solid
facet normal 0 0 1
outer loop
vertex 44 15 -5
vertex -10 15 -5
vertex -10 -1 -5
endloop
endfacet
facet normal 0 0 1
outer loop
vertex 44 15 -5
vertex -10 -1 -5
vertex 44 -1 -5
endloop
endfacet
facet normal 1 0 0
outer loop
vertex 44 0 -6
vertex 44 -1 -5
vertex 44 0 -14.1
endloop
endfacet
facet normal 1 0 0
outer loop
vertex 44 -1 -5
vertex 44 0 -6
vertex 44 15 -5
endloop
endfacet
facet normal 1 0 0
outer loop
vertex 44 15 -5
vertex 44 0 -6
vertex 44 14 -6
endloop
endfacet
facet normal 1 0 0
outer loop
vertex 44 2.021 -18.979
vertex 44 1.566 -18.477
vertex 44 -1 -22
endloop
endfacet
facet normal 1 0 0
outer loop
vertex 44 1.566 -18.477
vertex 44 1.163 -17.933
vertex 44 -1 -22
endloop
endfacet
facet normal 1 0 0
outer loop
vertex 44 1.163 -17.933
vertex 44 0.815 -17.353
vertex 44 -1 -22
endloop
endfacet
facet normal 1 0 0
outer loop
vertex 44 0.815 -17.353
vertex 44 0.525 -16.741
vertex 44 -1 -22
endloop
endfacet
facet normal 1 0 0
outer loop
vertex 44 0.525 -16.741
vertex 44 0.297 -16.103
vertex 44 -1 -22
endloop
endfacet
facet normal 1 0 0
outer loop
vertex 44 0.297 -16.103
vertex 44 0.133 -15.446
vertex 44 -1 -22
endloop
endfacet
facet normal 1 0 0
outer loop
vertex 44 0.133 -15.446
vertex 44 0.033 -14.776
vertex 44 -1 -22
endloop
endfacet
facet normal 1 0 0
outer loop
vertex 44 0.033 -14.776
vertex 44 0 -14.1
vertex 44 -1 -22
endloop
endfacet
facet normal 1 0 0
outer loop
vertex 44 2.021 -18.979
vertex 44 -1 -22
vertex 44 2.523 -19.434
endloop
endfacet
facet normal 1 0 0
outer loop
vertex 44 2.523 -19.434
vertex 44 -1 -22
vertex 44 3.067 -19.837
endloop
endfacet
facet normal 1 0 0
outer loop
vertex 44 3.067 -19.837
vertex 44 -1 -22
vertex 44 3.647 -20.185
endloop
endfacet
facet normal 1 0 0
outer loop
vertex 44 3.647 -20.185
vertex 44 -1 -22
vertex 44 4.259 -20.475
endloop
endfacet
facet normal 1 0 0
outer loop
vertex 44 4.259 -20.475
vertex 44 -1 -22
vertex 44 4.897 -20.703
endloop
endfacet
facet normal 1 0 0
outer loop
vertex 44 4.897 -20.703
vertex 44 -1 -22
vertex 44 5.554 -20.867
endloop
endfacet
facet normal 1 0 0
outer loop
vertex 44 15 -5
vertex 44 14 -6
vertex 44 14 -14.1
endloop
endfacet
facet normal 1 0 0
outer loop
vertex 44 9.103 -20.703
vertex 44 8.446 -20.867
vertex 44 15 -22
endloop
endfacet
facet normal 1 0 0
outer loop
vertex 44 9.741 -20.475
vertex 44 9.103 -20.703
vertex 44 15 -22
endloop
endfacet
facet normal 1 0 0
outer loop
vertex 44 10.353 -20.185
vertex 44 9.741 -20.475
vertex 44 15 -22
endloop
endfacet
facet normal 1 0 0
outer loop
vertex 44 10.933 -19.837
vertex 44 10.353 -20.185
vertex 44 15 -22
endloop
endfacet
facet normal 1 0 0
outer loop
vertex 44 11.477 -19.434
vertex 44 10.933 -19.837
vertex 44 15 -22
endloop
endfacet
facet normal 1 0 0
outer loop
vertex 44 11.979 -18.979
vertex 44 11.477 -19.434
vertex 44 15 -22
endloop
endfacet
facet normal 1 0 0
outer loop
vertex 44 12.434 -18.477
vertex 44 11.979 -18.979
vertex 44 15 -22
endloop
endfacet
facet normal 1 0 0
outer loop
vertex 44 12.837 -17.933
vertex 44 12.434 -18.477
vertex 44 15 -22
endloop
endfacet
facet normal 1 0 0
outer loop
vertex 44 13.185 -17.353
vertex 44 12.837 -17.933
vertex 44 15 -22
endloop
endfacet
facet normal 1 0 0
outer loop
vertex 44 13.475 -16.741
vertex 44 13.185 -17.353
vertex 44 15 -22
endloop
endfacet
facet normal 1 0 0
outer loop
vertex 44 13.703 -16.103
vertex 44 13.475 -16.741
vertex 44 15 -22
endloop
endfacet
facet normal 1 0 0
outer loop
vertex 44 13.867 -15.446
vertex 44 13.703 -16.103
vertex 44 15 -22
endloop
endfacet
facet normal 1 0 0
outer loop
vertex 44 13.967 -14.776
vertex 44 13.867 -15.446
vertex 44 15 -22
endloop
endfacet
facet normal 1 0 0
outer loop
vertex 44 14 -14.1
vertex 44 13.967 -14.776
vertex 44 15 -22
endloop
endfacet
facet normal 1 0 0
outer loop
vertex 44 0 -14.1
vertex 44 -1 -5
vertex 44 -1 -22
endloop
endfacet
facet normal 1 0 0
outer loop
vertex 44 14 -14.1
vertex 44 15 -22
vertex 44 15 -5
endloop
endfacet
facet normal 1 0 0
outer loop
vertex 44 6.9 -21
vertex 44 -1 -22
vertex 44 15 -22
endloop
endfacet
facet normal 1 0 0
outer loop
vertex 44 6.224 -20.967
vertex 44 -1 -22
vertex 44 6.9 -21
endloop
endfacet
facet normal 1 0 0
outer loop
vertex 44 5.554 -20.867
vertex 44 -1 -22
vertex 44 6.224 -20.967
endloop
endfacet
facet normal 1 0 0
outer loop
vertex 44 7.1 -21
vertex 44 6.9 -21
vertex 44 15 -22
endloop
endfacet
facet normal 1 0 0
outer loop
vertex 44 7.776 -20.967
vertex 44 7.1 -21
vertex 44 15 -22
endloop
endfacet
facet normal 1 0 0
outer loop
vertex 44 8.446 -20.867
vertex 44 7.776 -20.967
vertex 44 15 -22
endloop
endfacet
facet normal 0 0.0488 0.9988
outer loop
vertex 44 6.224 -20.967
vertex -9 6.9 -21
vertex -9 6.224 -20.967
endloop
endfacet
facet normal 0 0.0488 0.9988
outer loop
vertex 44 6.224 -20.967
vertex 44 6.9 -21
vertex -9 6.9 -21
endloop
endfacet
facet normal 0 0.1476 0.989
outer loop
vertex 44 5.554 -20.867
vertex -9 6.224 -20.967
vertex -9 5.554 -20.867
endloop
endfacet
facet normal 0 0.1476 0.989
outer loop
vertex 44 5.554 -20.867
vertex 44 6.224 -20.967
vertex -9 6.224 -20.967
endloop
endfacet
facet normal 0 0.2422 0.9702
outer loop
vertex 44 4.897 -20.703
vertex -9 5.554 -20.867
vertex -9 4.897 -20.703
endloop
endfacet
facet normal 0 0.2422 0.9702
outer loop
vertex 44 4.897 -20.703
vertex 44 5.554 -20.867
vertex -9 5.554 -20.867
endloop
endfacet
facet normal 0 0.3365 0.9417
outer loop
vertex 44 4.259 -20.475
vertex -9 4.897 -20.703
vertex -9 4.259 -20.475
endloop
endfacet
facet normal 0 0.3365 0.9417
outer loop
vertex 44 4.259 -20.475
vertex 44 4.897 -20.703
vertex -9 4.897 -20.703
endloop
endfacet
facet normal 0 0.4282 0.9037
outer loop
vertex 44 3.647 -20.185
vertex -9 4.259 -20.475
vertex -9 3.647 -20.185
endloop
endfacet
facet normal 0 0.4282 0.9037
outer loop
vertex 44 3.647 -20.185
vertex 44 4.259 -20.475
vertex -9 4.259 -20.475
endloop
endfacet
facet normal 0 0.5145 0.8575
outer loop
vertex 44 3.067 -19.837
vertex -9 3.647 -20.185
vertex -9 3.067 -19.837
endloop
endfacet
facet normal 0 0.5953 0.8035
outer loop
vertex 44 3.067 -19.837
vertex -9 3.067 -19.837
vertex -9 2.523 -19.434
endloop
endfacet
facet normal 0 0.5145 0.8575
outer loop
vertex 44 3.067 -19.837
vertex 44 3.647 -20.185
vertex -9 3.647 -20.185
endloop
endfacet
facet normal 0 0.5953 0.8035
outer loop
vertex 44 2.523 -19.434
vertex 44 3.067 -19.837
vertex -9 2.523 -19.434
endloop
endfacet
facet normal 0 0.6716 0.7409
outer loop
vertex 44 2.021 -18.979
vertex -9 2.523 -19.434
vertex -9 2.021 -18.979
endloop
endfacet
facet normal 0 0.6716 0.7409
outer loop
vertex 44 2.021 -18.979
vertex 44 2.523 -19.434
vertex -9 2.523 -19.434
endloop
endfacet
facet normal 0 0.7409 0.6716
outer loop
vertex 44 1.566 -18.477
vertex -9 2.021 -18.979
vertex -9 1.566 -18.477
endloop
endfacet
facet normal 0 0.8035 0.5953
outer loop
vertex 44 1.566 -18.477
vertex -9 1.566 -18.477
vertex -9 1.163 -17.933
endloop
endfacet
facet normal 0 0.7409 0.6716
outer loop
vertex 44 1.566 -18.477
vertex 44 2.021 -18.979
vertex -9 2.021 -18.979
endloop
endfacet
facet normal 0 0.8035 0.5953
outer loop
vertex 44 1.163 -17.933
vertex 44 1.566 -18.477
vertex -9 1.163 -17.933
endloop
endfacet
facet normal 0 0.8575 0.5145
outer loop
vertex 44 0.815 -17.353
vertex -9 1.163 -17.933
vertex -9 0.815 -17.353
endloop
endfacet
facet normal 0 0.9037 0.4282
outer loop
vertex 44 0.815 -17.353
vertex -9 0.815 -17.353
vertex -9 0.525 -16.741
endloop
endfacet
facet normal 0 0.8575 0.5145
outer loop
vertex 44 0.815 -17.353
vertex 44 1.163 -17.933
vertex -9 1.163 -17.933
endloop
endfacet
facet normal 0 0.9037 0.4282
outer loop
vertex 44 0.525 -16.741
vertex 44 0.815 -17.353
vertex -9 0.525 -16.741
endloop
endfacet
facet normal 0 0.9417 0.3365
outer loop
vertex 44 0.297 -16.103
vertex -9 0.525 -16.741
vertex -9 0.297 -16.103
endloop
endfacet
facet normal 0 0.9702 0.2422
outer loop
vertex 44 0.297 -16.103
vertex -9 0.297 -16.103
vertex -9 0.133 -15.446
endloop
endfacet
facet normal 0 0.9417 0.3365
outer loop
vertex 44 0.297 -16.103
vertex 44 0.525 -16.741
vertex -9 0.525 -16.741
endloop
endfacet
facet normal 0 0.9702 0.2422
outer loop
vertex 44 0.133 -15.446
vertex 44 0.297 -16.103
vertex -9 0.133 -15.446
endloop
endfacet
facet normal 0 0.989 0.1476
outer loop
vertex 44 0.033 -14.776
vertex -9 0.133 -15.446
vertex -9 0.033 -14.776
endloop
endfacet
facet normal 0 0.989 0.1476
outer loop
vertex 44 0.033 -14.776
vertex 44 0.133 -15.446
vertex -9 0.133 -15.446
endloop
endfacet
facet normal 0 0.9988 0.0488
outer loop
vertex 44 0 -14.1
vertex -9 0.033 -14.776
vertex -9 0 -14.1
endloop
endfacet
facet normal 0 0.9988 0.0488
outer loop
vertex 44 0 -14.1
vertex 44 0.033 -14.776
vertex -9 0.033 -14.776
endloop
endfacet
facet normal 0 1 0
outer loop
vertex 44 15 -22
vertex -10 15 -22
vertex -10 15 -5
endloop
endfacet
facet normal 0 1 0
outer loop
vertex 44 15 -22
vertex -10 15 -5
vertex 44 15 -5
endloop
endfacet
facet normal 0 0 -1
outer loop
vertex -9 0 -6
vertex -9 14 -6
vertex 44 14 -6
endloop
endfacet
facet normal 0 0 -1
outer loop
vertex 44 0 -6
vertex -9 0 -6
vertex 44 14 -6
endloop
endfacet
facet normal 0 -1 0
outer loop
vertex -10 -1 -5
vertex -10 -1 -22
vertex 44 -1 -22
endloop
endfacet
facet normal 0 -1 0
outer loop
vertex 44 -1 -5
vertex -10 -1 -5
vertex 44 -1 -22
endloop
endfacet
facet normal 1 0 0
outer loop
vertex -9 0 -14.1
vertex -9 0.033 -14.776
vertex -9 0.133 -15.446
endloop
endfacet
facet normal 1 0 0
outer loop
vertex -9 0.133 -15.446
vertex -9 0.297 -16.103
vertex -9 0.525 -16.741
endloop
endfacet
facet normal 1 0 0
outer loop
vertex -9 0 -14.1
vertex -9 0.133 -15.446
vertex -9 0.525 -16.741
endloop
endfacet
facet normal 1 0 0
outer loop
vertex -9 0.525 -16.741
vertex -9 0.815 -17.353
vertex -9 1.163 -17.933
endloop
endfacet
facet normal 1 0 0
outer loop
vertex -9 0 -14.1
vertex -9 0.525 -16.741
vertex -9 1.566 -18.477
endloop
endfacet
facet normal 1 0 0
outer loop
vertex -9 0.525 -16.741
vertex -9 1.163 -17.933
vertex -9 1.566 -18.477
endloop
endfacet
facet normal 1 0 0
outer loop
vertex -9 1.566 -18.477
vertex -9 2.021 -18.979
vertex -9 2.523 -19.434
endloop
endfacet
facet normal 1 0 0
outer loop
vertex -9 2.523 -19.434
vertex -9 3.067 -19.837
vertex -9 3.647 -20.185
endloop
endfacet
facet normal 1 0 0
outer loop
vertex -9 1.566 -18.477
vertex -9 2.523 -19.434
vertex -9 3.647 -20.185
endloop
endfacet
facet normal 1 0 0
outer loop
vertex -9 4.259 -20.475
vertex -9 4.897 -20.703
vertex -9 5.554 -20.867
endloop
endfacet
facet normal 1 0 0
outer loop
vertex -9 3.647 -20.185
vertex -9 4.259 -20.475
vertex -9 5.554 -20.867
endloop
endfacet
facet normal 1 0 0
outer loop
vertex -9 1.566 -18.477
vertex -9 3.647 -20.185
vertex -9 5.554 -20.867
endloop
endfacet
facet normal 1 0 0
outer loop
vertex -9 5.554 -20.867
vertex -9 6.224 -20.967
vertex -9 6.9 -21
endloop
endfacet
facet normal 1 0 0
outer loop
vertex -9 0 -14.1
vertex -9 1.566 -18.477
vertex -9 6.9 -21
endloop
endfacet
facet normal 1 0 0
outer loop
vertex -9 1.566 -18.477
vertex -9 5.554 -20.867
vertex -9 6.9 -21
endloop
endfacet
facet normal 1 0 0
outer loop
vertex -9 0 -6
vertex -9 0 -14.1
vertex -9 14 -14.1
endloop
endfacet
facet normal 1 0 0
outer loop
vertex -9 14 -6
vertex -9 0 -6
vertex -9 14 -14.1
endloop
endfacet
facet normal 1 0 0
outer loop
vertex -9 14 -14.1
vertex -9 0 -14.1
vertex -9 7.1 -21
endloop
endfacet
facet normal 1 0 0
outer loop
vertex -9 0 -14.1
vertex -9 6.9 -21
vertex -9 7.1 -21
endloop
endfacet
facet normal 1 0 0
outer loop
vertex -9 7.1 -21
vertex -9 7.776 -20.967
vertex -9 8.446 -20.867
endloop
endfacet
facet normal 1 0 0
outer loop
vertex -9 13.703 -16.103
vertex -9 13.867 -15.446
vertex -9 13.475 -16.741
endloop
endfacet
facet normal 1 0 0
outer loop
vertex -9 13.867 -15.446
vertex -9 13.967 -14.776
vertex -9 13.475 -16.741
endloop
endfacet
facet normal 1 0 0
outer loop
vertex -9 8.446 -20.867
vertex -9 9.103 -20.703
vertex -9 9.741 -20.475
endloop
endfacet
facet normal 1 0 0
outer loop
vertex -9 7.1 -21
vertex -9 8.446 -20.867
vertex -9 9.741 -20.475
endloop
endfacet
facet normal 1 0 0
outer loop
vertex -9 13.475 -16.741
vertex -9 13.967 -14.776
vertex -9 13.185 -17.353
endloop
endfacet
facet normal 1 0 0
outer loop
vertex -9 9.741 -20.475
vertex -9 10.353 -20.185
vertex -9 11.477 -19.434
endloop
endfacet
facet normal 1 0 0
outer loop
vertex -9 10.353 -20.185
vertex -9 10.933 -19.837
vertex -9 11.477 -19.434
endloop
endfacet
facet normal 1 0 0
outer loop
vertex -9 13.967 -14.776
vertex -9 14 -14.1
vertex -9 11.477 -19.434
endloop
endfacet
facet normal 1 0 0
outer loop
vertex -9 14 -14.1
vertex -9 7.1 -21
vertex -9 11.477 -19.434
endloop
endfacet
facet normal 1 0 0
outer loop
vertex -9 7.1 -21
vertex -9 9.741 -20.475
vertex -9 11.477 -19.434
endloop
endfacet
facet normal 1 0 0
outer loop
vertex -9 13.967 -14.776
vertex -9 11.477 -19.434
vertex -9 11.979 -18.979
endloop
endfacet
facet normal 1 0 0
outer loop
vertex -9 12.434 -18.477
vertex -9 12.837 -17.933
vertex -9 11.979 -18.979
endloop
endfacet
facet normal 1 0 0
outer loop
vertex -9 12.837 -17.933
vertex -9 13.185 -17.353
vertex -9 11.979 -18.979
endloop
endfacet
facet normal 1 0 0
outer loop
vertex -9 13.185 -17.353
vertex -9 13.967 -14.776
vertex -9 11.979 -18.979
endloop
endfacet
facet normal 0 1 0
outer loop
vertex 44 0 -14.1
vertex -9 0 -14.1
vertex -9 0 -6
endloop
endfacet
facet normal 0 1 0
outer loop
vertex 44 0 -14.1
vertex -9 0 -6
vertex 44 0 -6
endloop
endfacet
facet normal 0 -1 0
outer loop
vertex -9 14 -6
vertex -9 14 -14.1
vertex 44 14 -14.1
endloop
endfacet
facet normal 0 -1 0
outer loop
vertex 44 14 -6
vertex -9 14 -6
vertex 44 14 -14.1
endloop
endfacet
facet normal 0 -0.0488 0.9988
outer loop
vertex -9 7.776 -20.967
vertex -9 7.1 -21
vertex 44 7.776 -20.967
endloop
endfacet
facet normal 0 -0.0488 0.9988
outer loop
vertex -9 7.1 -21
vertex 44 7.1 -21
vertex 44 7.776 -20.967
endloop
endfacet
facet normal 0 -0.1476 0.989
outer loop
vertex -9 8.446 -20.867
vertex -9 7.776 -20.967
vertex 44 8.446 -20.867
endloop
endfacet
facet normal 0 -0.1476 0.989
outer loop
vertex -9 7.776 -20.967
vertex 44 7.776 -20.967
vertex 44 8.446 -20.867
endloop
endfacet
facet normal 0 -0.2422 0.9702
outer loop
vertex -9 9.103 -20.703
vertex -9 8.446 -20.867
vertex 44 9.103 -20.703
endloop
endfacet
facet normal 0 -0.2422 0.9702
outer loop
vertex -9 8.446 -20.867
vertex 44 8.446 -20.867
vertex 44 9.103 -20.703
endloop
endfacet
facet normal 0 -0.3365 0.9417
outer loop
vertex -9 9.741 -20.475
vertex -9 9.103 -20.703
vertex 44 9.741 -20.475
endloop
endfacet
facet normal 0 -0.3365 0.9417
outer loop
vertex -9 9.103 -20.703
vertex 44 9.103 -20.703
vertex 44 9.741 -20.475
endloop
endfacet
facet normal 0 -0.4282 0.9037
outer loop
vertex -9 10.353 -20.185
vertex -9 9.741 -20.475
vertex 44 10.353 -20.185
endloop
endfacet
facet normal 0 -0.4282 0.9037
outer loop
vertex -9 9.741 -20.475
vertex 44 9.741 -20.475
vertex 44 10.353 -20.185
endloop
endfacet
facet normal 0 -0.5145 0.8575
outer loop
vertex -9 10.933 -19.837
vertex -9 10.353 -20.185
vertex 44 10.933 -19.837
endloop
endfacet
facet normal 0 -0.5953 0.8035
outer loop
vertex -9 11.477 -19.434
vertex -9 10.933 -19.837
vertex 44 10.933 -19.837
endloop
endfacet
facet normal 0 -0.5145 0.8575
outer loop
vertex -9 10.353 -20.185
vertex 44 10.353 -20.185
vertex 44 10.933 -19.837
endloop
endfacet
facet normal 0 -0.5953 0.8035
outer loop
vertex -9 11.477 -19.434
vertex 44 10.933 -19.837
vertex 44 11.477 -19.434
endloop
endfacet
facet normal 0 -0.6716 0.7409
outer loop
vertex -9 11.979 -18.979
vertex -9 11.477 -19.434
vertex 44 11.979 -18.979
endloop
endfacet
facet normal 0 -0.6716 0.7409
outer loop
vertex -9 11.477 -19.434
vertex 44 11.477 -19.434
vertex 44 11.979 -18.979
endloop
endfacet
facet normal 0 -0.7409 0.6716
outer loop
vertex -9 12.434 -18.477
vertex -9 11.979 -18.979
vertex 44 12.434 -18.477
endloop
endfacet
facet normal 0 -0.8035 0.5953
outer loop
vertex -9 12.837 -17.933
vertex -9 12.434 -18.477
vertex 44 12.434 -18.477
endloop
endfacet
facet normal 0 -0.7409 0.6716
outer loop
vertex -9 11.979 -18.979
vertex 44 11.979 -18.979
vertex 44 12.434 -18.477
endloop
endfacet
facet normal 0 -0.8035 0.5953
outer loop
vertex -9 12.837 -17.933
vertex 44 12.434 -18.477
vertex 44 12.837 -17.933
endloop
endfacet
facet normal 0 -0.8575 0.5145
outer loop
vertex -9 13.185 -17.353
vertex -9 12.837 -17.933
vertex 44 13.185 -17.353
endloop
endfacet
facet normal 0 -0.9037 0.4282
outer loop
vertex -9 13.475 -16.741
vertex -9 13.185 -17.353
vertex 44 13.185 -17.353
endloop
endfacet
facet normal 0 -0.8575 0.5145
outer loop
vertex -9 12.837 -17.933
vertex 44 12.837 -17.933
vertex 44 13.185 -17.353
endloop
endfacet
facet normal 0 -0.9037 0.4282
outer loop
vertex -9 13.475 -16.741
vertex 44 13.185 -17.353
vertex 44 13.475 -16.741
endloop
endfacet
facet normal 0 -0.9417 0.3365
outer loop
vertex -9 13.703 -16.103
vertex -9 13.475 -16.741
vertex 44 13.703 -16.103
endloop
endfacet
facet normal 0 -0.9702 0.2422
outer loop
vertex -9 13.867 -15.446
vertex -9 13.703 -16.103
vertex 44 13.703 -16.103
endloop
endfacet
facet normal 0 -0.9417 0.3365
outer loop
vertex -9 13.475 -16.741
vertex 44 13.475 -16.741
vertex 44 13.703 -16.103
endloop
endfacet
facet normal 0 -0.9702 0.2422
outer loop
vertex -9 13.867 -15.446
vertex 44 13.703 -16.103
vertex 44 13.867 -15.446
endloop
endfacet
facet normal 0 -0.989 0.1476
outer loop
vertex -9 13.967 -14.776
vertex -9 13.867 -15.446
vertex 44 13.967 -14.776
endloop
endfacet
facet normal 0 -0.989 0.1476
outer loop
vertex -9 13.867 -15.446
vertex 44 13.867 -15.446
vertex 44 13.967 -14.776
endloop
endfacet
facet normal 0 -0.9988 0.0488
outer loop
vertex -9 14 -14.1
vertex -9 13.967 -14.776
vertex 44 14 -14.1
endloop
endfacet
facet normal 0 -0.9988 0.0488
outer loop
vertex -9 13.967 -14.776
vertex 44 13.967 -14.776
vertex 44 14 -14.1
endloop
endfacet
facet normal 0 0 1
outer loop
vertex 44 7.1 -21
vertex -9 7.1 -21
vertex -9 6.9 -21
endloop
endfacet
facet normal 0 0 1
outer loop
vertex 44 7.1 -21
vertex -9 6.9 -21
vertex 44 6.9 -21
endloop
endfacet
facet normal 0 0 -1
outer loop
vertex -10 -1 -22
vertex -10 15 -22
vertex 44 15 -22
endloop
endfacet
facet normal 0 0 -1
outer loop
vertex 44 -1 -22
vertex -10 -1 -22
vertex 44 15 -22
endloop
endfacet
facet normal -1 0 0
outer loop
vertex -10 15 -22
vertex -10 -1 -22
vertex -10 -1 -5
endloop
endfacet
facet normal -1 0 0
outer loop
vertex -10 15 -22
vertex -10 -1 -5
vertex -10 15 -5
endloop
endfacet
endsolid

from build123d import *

# Parameters (mm, degrees)
BOX031_W     = 54
BOX031_H     = 14
BOX031_DEPTH = 15
BOX022_W     = 54
BOX022_H     = 16
BOX022_DEPTH = 17
FILLET_R     = 6.9
FILLET001_R  = 6.9


with BuildPart() as batterypack003:
    # Box031 → Box031 (new body)
    with BuildSketch(Plane(origin=(-9, 0, -21), x_dir=(1, 0, 0), z_dir=(0, 0, 1))):
        with Locations((27, 7)):
            Rectangle(BOX031_W, BOX031_H)
    extrude(amount=BOX031_DEPTH)


with BuildPart() as fillet001:
    # Box022 → Box022 (new body)
    with BuildSketch(Plane(origin=(-10, -1, -22), x_dir=(1, 0, 0), z_dir=(0, 0, 1))):
        with Locations((27, 8)):
            Rectangle(BOX022_W, BOX022_H)
    extrude(amount=BOX022_DEPTH)

    # Cut: cut BatteryPack003
    add(batterypack003.part, mode=Mode.SUBTRACT)

    # Fillet
    fillet_edges = [fillet001.edges().sort_by_distance(p)[0] for p in [
        (17.5, 0, -21),
    ]]
    fillet(fillet_edges, radius=FILLET_R)

    # Fillet001
    fillet001_edges = [fillet001.edges().sort_by_distance(p)[0] for p in [
        (17.5, 14, -21),
    ]]
    fillet(fillet001_edges, radius=FILLET001_R)


solid = fillet001.part
